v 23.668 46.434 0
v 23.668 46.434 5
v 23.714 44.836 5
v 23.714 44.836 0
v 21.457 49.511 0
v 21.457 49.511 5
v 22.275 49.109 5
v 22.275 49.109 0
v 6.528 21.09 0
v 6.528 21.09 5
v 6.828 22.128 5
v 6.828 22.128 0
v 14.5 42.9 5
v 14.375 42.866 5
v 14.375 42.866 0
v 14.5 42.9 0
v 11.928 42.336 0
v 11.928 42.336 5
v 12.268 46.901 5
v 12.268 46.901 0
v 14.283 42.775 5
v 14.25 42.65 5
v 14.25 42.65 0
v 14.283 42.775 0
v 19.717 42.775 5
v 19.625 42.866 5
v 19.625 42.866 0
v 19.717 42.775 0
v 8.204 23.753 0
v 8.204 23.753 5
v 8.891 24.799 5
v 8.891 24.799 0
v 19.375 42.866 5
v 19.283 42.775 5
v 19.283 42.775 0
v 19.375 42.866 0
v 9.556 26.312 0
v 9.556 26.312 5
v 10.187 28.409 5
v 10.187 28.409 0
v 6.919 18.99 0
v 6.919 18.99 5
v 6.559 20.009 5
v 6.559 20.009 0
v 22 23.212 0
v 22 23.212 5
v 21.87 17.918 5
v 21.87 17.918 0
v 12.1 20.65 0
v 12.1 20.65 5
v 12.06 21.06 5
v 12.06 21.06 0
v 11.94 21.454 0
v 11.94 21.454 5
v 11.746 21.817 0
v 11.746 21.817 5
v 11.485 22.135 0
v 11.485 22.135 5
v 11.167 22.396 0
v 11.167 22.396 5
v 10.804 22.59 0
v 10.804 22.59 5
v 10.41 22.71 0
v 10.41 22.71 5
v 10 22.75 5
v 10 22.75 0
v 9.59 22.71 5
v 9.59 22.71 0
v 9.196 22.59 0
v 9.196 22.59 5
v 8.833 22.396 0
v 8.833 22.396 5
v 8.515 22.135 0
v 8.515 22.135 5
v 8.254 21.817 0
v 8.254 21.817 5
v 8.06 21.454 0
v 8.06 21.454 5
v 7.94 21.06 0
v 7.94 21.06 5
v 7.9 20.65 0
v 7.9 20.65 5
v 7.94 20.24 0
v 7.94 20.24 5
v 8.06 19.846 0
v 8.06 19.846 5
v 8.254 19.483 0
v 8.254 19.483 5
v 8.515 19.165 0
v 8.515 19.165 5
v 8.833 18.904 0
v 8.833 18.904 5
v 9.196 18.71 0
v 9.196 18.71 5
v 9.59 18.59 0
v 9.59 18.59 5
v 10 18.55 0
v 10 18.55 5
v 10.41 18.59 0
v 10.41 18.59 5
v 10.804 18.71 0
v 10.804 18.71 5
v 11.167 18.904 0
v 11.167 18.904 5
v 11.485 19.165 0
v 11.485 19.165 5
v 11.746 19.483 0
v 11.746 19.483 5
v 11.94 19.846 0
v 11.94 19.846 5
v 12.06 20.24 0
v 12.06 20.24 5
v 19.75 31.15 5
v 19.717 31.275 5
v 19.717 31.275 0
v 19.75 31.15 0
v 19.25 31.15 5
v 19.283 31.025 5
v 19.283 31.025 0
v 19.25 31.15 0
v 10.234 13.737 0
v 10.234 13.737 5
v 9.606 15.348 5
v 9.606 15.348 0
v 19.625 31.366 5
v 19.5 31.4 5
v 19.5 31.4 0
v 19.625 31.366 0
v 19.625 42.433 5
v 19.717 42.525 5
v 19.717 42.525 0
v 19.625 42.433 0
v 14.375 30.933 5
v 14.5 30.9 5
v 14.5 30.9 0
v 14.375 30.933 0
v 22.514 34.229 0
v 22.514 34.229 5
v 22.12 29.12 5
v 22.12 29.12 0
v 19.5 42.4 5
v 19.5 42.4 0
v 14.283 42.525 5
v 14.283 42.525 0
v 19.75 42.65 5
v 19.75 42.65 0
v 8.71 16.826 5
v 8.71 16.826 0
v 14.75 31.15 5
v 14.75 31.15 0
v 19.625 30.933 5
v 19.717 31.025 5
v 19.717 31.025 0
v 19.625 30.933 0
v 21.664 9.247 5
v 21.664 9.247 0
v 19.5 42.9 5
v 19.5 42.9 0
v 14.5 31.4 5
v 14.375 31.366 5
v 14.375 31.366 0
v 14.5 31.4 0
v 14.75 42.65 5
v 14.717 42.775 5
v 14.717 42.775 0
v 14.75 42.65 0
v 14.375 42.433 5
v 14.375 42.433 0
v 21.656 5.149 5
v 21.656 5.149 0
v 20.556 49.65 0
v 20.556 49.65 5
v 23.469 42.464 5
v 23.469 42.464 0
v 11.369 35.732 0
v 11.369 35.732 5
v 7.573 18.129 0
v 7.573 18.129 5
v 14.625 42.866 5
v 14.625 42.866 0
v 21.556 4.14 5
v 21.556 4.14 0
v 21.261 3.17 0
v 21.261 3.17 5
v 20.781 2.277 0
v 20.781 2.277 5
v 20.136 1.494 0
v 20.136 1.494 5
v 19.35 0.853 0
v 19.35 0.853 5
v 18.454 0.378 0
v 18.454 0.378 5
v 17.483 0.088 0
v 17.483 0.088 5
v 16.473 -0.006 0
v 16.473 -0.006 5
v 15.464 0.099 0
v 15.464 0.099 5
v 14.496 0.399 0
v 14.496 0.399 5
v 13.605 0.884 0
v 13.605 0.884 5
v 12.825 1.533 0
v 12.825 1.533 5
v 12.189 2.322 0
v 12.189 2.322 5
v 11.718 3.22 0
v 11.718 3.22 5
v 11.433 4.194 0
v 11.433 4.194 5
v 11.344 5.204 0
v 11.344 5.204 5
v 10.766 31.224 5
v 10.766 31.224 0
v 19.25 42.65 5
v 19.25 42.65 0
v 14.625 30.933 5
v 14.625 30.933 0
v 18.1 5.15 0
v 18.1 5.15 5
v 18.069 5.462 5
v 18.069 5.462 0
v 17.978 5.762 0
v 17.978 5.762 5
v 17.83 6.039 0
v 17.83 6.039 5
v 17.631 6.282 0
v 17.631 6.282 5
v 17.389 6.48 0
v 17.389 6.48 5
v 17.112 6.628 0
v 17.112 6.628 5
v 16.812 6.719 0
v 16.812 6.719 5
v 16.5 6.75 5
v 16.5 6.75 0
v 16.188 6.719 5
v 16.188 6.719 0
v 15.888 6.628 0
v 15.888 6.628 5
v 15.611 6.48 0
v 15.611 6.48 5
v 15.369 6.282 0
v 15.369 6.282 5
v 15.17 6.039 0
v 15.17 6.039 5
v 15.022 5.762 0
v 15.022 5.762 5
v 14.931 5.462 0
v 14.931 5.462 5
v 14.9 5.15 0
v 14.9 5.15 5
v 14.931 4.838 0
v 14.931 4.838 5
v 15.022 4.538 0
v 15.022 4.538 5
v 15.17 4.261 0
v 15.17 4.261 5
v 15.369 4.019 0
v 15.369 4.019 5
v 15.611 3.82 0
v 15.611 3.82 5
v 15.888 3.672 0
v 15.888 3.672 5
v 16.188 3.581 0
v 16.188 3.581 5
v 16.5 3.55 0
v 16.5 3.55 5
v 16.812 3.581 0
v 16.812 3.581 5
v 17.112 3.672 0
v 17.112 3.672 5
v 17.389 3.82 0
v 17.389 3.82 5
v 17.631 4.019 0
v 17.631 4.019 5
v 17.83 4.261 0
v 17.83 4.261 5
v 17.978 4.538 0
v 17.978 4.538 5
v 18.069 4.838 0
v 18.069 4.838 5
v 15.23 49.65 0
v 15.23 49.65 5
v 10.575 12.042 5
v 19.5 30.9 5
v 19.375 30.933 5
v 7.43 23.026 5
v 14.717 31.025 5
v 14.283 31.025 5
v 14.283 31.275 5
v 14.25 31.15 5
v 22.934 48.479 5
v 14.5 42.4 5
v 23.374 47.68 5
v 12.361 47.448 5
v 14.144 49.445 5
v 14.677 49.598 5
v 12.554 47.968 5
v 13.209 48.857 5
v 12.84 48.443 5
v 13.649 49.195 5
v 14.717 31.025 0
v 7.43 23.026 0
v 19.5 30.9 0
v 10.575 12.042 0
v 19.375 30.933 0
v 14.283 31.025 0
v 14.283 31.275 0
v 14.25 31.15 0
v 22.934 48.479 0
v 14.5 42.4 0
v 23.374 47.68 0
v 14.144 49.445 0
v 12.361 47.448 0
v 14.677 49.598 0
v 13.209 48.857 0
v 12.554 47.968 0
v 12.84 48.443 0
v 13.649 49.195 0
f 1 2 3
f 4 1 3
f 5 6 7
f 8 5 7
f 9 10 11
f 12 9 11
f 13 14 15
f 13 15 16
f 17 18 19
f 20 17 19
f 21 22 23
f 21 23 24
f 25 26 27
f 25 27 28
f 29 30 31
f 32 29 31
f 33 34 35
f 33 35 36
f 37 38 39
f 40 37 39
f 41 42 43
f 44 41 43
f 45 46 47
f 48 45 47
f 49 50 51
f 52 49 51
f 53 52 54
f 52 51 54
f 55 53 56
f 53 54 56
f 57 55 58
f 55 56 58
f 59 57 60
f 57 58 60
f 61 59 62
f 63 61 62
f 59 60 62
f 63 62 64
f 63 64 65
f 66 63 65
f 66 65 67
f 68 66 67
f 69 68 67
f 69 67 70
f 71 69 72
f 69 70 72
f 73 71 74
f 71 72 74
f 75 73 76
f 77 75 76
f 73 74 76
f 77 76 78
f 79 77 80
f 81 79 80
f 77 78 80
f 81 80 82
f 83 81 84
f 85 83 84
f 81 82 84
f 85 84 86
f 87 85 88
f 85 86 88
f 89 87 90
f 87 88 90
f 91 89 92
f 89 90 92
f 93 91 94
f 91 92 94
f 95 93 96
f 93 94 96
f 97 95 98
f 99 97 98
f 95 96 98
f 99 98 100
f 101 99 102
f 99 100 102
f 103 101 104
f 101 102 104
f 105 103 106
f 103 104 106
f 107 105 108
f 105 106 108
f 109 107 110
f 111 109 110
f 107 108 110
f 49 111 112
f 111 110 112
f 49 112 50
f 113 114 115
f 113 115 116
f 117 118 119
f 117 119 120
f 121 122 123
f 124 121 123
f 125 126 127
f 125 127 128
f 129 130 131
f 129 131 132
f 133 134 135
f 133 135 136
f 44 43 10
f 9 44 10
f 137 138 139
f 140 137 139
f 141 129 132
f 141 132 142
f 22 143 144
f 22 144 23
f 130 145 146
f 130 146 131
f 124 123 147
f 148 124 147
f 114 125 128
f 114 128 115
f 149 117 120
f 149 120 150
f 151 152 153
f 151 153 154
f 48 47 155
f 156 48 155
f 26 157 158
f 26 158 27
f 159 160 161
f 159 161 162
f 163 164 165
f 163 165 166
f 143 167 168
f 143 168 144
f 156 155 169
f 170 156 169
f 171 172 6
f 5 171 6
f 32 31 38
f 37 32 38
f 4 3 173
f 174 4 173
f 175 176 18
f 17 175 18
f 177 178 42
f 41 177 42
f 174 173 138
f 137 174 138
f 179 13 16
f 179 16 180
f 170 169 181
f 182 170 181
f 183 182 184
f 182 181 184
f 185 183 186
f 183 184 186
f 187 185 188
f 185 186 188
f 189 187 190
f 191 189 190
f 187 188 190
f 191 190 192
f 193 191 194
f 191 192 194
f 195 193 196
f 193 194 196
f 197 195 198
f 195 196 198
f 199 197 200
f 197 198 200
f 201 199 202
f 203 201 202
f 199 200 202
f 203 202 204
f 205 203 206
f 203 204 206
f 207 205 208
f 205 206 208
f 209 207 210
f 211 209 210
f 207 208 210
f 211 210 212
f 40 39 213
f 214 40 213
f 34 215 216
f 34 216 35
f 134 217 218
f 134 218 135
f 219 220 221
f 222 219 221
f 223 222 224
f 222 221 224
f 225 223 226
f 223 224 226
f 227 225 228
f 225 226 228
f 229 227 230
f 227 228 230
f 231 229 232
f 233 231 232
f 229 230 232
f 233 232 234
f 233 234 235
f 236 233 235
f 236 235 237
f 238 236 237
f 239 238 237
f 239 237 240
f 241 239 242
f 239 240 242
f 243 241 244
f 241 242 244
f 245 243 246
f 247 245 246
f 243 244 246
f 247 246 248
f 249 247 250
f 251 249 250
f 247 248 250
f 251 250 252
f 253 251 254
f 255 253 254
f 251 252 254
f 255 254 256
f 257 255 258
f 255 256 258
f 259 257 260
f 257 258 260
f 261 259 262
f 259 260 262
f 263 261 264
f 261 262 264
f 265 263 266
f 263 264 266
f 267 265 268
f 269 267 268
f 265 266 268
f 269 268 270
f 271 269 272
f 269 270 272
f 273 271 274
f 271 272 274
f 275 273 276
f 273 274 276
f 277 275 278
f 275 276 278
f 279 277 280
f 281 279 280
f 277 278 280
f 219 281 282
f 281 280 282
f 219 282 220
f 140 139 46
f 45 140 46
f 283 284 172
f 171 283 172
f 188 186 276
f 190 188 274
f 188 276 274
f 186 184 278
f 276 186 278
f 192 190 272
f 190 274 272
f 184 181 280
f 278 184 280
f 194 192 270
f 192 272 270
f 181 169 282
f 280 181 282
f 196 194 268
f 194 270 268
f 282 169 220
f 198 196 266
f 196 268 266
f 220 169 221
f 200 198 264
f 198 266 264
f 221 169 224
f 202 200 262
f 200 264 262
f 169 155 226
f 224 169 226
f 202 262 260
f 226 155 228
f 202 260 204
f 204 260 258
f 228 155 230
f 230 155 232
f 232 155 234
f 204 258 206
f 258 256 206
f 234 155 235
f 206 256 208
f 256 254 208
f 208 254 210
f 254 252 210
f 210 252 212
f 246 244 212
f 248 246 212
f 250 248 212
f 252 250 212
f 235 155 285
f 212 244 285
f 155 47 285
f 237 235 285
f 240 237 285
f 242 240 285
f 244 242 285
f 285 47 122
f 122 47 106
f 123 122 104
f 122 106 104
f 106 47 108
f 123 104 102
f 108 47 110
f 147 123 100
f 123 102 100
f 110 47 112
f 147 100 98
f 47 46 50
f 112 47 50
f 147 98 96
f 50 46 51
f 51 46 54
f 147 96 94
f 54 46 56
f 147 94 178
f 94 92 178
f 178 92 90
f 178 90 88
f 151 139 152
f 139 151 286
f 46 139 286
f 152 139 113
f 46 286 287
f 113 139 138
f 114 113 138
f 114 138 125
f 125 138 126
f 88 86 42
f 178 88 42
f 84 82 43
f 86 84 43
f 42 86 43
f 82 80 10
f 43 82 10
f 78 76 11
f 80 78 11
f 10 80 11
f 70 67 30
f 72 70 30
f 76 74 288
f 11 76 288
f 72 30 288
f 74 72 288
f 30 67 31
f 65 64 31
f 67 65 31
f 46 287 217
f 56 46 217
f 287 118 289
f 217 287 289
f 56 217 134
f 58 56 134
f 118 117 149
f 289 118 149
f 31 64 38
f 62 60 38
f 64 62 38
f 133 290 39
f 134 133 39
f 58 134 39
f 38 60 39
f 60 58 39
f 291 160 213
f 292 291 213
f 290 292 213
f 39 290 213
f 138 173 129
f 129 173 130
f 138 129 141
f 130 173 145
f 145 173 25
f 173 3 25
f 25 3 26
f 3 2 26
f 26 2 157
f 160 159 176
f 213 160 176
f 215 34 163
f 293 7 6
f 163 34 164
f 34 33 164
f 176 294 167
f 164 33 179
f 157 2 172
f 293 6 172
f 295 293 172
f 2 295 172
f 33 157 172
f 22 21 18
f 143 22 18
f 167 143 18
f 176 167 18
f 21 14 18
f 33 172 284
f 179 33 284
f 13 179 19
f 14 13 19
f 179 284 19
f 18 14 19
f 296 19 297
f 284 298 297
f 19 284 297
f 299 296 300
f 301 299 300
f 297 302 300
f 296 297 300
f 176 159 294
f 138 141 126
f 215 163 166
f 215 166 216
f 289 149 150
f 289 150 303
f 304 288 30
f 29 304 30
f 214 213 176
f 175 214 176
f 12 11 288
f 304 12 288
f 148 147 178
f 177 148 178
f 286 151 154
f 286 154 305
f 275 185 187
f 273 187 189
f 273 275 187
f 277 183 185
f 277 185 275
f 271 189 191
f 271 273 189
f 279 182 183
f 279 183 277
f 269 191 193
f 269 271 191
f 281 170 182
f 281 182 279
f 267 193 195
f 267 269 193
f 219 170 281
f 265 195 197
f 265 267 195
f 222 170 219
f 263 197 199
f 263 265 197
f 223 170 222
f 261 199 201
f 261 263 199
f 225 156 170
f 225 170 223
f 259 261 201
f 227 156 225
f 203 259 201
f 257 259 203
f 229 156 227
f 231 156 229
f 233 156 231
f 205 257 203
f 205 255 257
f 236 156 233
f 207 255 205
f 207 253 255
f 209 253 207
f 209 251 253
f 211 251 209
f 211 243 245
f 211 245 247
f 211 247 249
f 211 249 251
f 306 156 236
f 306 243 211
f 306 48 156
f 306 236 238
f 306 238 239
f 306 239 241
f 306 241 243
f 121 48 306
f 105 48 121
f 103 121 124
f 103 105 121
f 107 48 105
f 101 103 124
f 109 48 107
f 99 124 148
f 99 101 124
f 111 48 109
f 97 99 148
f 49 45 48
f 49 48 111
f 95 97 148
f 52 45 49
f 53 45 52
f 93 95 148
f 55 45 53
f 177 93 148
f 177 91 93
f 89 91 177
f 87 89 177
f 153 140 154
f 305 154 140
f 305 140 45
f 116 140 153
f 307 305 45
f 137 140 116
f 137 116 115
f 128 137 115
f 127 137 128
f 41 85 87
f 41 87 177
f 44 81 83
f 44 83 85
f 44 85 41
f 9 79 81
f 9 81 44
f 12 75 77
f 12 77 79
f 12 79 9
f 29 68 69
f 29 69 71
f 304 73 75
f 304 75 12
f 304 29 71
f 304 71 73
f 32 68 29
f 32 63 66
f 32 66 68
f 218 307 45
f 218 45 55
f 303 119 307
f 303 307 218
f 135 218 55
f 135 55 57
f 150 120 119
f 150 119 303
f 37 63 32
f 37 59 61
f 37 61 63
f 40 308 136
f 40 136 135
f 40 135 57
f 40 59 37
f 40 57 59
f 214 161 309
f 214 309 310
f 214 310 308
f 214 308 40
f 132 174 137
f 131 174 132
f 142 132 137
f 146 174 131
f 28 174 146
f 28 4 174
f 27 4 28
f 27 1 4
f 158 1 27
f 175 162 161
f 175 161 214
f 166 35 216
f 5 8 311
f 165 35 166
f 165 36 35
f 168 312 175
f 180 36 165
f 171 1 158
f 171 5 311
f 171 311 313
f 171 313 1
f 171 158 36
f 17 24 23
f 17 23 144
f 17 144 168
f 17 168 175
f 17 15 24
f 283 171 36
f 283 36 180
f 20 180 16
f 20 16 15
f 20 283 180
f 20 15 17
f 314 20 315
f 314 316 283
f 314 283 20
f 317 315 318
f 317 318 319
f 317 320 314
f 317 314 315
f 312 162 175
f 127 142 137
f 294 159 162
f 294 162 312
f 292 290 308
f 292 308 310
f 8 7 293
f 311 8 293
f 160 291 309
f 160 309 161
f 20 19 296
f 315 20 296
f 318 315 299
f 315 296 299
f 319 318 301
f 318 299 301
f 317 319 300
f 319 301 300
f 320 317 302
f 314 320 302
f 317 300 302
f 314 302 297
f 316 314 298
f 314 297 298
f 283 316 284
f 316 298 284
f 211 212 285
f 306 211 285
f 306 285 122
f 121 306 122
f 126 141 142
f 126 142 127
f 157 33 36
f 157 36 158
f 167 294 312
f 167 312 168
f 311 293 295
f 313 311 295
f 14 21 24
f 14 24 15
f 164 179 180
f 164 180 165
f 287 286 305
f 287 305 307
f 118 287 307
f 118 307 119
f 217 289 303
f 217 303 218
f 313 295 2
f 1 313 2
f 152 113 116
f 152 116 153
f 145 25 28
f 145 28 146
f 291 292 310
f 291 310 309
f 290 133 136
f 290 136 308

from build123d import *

# Parameters (mm, degrees)
ESQUISSE1_R        = 2.1
ESQUISSE1_R_2      = 1.6
BOSS_EXTRU_1_DEPTH = 5


with BuildPart() as part:
    # Esquisse1 → Boss.-Extru.1 (new body)
    with BuildSketch(Plane.XY.offset(5)):
        with BuildLine():
            Line((21.663586585, 9.246660578), (21.65632273, 5.149368071))
            ThreePointArc((21.65632273, 5.149368071), (16.472816032, -0.006118111), (11.343954037, 5.203733528))
            Line((11.343954037, 5.203733528), (10.574629149, 12.042199031))
            Line((10.574629149, 12.042199031), (10.233579176, 13.737028894))
            Line((10.233579176, 13.737028894), (9.605716227, 15.347798765))
            Line((9.605716227, 15.347798765), (8.709809299, 16.826348646))
            Line((8.709809299, 16.826348646), (7.572636391, 18.128508541))
            Line((7.572636391, 18.128508541), (6.918936443, 18.989558472))
            Line((6.918936443, 18.989558472), (6.559190472, 20.00903839))
            Line((6.559190472, 20.00903839), (6.527723475, 21.089658303))
            Line((6.527723475, 21.089658303), (6.827536451, 22.128338219))
            Line((6.827536451, 22.128338219), (7.430024402, 23.025968147))
            Line((7.430024402, 23.025968147), (8.20419734, 23.752548088))
            Line((8.20419734, 23.752548088), (8.890967284, 24.798538004))
            Line((8.890967284, 24.798538004), (9.556249231, 26.311877882))
            Line((9.556249231, 26.311877882), (10.18684918, 28.409207714))
            Line((10.18684918, 28.409207714), (10.765999134, 31.224477487))
            Line((10.765999134, 31.224477487), (11.369489085, 35.732217124))
            Line((11.369489085, 35.732217124), (11.92756904, 42.336066593))
            Line((11.92756904, 42.336066593), (12.268069386, 46.901117167))
            ThreePointArc((12.268069386, 46.901117167), (13.209278732, 48.85686853), (15.229621264, 49.649998078))
            Line((15.229621264, 49.649998078), (20.556119459, 49.649998078))
            Line((20.556119459, 49.649998078), (21.457249103, 49.511456244))
            Line((21.457249103, 49.511456244), (22.275158213, 49.108634602))
            Line((22.275158213, 49.108634602), (22.93428687, 48.478733303))
            Line((22.93428687, 48.478733303), (23.373775199, 47.679942467))
            Line((23.373775199, 47.679942467), (23.668052623, 46.433641965))
            Line((23.668052623, 46.433641965), (23.713799348, 44.835742))
            Line((23.713799348, 44.835742), (23.469414511, 42.463982691))
            Line((23.469414511, 42.463982691), (22.514057727, 34.22916531))
            Line((22.514057727, 34.22916531), (22.119847298, 29.119826528))
            Line((22.119847298, 29.119826528), (22.000035211, 23.212167249))
            Line((22.000035211, 23.212167249), (21.870164382, 17.918027941))
            Line((21.870164382, 17.918027941), (21.663586585, 9.246660578))
        make_face()
        with Locations((9.999996695, 20.649998987)):
            Circle(ESQUISSE1_R, mode=Mode.SUBTRACT)
        with Locations((16.499999118, 5.150133907)):
            Circle(ESQUISSE1_R_2, mode=Mode.SUBTRACT)
        Polygon((14.249998853, 42.649996567), (14.28348885, 42.774996557), (14.374998843, 42.86649655), (14.499998833, 42.899996547), (14.624998823, 42.86649655), (14.716508816, 42.774996557), (14.749998813, 42.649996567), (19.249998451, 42.649996567), (19.283488448, 42.774996557), (19.374998441, 42.86649655), (19.499998431, 42.899996547), (19.624998421, 42.86649655), (19.716508413, 42.774996557), (19.74999841, 42.649996567), (19.716508413, 42.524996577), (19.624998421, 42.433486585), (19.499998431, 42.399996588), (19.499998431, 31.399997473), (19.624998421, 31.366497476), (19.716508413, 31.274997483), (19.74999841, 31.149997493), (19.716508413, 31.024997503), (19.624998421, 30.93348751), (19.499998431, 30.899997513), (19.374998441, 30.93348751), (19.283488448, 31.024997503), (19.249998451, 31.149997493), (14.749998813, 31.149997493), (14.716508816, 31.024997503), (14.624998823, 30.93348751), (14.499998833, 30.899997513), (14.374998843, 30.93348751), (14.28348885, 31.024997503), (14.249998853, 31.149997493), (14.28348885, 31.274997483), (14.374998843, 31.366497476), (14.499998833, 31.399997473), (14.499998833, 42.399996588), (14.374998843, 42.433486585), (14.28348885, 42.524996577), align=None, mode=Mode.SUBTRACT)
    extrude(amount=-BOSS_EXTRU_1_DEPTH)


solid = part.part
